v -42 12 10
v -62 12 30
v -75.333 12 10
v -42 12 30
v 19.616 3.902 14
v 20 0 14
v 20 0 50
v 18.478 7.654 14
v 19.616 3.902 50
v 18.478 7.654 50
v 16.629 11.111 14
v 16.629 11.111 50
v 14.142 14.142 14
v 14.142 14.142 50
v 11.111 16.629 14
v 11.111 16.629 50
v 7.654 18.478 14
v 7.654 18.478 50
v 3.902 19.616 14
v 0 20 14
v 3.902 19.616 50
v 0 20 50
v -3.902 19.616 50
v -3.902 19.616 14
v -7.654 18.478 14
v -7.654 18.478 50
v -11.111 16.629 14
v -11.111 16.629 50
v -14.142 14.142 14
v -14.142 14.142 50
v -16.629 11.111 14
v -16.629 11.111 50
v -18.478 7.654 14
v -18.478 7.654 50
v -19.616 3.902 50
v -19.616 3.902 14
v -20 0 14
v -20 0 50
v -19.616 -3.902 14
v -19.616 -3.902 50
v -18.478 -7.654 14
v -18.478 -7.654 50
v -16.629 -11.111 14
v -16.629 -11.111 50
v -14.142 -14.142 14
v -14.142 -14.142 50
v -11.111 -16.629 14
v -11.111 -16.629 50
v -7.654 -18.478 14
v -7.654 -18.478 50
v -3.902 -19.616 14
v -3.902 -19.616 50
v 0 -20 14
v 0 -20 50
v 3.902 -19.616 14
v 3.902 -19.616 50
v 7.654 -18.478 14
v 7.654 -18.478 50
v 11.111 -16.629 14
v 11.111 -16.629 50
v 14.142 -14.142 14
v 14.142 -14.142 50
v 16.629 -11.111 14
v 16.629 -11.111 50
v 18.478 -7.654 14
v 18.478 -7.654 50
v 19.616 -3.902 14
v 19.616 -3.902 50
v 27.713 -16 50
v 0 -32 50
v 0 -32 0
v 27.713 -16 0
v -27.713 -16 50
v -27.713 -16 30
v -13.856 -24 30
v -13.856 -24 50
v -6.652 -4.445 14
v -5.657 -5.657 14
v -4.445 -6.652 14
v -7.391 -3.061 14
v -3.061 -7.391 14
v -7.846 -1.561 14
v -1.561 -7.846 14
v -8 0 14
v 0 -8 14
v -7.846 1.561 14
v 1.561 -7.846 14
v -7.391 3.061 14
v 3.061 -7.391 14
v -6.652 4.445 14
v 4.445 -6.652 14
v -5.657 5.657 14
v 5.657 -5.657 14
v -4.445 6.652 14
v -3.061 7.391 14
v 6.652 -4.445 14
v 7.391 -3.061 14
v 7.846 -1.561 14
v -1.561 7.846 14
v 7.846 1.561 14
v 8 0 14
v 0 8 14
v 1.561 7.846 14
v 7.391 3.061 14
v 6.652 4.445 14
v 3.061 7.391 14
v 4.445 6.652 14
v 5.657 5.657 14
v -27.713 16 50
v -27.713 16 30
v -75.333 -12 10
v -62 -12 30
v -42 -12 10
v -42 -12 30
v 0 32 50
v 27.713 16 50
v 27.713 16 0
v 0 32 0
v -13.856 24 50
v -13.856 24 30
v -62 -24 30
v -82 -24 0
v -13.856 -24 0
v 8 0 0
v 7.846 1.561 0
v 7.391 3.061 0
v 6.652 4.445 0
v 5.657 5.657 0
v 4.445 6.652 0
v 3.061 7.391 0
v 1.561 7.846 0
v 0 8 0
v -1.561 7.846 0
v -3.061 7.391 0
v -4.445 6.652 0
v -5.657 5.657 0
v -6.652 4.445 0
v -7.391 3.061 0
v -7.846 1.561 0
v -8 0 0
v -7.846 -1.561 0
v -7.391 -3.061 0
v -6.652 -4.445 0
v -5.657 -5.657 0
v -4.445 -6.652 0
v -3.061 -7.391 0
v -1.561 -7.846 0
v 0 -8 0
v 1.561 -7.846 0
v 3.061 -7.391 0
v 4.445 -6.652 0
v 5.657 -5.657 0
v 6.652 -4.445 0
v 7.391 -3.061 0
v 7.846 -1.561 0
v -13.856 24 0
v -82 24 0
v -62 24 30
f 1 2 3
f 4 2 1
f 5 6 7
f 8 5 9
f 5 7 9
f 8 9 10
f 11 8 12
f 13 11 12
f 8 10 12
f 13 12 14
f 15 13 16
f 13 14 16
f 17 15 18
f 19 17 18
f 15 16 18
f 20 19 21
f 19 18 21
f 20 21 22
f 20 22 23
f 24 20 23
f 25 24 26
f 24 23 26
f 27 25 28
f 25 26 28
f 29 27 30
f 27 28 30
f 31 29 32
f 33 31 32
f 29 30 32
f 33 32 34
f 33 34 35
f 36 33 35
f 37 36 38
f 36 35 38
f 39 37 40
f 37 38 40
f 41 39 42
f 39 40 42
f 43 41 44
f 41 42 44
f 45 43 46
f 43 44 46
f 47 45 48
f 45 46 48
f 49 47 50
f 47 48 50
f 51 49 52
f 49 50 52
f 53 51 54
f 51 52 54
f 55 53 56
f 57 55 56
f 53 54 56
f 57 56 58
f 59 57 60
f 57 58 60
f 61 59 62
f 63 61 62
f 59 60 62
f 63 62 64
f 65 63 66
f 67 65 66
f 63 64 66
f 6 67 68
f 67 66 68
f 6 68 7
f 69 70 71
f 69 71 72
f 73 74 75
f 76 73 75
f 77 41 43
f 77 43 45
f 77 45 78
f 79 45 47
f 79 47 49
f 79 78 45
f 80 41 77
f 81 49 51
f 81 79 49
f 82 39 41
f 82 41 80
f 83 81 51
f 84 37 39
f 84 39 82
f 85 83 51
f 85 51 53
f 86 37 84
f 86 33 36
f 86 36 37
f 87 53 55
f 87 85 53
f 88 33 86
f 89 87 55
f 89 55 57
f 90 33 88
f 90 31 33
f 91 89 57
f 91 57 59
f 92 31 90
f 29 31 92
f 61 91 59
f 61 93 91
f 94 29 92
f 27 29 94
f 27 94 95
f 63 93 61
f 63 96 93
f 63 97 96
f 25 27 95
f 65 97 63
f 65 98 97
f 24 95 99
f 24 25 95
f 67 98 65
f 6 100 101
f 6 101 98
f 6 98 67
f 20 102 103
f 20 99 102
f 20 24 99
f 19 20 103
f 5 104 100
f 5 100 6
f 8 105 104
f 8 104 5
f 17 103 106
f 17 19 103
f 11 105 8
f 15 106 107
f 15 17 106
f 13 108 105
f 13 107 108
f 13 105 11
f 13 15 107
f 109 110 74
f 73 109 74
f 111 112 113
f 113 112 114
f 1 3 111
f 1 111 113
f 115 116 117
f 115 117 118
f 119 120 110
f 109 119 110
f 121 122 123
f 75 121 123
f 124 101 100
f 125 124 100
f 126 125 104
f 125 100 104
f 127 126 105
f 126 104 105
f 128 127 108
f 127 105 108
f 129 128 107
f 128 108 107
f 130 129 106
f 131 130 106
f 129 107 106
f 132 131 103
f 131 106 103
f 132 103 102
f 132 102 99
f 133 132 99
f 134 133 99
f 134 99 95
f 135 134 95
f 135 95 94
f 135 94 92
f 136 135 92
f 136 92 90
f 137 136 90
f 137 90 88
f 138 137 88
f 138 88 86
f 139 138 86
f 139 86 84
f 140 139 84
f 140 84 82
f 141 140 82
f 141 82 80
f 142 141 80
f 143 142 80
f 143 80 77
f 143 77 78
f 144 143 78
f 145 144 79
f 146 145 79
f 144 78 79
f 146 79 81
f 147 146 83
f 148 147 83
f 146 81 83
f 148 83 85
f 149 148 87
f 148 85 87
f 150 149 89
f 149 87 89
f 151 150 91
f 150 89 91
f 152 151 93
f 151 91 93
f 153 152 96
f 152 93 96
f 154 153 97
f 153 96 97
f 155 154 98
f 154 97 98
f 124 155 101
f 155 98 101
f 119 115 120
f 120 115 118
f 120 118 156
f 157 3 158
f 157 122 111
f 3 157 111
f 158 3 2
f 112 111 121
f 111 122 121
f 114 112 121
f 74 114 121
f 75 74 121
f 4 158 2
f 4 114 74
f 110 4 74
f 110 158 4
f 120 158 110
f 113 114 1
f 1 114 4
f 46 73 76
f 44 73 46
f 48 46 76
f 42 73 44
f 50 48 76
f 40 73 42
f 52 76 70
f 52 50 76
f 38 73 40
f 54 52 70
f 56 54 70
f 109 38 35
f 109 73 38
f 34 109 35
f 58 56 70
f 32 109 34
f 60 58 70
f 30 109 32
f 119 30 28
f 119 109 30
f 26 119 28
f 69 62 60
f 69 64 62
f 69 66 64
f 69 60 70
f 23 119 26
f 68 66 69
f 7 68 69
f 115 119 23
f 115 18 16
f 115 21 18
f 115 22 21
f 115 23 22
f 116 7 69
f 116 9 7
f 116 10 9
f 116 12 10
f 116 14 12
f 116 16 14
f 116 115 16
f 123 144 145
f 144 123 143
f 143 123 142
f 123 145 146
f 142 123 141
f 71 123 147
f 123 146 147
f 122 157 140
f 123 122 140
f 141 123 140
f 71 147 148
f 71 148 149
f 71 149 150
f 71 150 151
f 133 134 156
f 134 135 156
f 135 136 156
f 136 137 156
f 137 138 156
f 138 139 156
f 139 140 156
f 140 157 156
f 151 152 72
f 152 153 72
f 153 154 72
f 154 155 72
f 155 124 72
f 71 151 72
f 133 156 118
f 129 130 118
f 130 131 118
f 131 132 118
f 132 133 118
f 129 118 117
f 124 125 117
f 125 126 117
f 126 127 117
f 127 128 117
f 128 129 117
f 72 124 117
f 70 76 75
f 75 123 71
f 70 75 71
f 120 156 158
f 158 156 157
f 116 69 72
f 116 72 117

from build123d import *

# Parameters (mm, degrees)
F1_DEPTH  = 30
F2_DEPTH  = 50
F3_R      = 20
F4_DEPTH  = 36
F5_R      = 8
F6_DEPTH  = 14.001
F7_W      = 40
F7_H      = 24
F8_DEPTH  = 20
F10_DEPTH = 56.001


with BuildPart() as f1:
    # F0 (on Top) → F1 (new body)
    with BuildSketch(Plane.XY):
        Polygon((-27.712813, 16), (-13.856406, 24), (-82, 24), (-82, -24), (-13.856406, -24), (-27.712813, -16), align=None)
    extrude(amount=F1_DEPTH)

    # F0 (on Top) → F2 (join)
    with BuildSketch(Plane.XY):
        Polygon((27.712813, 16), (0, 32), (-13.856406, 24), (-27.712813, 16), (-27.712813, -16), (-13.856406, -24), (0, -32), (27.712813, -16), align=None)
    extrude(amount=F2_DEPTH)

    # F3 (on face) → F4 (cut)
    with BuildSketch(Plane.XY.offset(50)):
        Circle(F3_R)
    extrude(amount=-F4_DEPTH, mode=Mode.SUBTRACT)

    # F5 (on face) → F6 (cut, through all)
    with BuildSketch(Plane.XY.offset(14)):
        Circle(F5_R)
    extrude(amount=-F6_DEPTH, mode=Mode.SUBTRACT)

    # F7 (on face) → F8 (cut)
    with BuildSketch(Plane.XY.offset(30)):
        with Locations((-62, 0)):
            Rectangle(F7_W, F7_H)
    extrude(amount=-F8_DEPTH, mode=Mode.SUBTRACT)

    # F9 (on face) → F10 (cut, through all)
    with BuildSketch(Plane.XZ.offset(24)):
        Polygon((-82, 30), (-82, 0), (-62, 30), align=None)
    extrude(amount=-F10_DEPTH, mode=Mode.SUBTRACT)


solid = f1.part
